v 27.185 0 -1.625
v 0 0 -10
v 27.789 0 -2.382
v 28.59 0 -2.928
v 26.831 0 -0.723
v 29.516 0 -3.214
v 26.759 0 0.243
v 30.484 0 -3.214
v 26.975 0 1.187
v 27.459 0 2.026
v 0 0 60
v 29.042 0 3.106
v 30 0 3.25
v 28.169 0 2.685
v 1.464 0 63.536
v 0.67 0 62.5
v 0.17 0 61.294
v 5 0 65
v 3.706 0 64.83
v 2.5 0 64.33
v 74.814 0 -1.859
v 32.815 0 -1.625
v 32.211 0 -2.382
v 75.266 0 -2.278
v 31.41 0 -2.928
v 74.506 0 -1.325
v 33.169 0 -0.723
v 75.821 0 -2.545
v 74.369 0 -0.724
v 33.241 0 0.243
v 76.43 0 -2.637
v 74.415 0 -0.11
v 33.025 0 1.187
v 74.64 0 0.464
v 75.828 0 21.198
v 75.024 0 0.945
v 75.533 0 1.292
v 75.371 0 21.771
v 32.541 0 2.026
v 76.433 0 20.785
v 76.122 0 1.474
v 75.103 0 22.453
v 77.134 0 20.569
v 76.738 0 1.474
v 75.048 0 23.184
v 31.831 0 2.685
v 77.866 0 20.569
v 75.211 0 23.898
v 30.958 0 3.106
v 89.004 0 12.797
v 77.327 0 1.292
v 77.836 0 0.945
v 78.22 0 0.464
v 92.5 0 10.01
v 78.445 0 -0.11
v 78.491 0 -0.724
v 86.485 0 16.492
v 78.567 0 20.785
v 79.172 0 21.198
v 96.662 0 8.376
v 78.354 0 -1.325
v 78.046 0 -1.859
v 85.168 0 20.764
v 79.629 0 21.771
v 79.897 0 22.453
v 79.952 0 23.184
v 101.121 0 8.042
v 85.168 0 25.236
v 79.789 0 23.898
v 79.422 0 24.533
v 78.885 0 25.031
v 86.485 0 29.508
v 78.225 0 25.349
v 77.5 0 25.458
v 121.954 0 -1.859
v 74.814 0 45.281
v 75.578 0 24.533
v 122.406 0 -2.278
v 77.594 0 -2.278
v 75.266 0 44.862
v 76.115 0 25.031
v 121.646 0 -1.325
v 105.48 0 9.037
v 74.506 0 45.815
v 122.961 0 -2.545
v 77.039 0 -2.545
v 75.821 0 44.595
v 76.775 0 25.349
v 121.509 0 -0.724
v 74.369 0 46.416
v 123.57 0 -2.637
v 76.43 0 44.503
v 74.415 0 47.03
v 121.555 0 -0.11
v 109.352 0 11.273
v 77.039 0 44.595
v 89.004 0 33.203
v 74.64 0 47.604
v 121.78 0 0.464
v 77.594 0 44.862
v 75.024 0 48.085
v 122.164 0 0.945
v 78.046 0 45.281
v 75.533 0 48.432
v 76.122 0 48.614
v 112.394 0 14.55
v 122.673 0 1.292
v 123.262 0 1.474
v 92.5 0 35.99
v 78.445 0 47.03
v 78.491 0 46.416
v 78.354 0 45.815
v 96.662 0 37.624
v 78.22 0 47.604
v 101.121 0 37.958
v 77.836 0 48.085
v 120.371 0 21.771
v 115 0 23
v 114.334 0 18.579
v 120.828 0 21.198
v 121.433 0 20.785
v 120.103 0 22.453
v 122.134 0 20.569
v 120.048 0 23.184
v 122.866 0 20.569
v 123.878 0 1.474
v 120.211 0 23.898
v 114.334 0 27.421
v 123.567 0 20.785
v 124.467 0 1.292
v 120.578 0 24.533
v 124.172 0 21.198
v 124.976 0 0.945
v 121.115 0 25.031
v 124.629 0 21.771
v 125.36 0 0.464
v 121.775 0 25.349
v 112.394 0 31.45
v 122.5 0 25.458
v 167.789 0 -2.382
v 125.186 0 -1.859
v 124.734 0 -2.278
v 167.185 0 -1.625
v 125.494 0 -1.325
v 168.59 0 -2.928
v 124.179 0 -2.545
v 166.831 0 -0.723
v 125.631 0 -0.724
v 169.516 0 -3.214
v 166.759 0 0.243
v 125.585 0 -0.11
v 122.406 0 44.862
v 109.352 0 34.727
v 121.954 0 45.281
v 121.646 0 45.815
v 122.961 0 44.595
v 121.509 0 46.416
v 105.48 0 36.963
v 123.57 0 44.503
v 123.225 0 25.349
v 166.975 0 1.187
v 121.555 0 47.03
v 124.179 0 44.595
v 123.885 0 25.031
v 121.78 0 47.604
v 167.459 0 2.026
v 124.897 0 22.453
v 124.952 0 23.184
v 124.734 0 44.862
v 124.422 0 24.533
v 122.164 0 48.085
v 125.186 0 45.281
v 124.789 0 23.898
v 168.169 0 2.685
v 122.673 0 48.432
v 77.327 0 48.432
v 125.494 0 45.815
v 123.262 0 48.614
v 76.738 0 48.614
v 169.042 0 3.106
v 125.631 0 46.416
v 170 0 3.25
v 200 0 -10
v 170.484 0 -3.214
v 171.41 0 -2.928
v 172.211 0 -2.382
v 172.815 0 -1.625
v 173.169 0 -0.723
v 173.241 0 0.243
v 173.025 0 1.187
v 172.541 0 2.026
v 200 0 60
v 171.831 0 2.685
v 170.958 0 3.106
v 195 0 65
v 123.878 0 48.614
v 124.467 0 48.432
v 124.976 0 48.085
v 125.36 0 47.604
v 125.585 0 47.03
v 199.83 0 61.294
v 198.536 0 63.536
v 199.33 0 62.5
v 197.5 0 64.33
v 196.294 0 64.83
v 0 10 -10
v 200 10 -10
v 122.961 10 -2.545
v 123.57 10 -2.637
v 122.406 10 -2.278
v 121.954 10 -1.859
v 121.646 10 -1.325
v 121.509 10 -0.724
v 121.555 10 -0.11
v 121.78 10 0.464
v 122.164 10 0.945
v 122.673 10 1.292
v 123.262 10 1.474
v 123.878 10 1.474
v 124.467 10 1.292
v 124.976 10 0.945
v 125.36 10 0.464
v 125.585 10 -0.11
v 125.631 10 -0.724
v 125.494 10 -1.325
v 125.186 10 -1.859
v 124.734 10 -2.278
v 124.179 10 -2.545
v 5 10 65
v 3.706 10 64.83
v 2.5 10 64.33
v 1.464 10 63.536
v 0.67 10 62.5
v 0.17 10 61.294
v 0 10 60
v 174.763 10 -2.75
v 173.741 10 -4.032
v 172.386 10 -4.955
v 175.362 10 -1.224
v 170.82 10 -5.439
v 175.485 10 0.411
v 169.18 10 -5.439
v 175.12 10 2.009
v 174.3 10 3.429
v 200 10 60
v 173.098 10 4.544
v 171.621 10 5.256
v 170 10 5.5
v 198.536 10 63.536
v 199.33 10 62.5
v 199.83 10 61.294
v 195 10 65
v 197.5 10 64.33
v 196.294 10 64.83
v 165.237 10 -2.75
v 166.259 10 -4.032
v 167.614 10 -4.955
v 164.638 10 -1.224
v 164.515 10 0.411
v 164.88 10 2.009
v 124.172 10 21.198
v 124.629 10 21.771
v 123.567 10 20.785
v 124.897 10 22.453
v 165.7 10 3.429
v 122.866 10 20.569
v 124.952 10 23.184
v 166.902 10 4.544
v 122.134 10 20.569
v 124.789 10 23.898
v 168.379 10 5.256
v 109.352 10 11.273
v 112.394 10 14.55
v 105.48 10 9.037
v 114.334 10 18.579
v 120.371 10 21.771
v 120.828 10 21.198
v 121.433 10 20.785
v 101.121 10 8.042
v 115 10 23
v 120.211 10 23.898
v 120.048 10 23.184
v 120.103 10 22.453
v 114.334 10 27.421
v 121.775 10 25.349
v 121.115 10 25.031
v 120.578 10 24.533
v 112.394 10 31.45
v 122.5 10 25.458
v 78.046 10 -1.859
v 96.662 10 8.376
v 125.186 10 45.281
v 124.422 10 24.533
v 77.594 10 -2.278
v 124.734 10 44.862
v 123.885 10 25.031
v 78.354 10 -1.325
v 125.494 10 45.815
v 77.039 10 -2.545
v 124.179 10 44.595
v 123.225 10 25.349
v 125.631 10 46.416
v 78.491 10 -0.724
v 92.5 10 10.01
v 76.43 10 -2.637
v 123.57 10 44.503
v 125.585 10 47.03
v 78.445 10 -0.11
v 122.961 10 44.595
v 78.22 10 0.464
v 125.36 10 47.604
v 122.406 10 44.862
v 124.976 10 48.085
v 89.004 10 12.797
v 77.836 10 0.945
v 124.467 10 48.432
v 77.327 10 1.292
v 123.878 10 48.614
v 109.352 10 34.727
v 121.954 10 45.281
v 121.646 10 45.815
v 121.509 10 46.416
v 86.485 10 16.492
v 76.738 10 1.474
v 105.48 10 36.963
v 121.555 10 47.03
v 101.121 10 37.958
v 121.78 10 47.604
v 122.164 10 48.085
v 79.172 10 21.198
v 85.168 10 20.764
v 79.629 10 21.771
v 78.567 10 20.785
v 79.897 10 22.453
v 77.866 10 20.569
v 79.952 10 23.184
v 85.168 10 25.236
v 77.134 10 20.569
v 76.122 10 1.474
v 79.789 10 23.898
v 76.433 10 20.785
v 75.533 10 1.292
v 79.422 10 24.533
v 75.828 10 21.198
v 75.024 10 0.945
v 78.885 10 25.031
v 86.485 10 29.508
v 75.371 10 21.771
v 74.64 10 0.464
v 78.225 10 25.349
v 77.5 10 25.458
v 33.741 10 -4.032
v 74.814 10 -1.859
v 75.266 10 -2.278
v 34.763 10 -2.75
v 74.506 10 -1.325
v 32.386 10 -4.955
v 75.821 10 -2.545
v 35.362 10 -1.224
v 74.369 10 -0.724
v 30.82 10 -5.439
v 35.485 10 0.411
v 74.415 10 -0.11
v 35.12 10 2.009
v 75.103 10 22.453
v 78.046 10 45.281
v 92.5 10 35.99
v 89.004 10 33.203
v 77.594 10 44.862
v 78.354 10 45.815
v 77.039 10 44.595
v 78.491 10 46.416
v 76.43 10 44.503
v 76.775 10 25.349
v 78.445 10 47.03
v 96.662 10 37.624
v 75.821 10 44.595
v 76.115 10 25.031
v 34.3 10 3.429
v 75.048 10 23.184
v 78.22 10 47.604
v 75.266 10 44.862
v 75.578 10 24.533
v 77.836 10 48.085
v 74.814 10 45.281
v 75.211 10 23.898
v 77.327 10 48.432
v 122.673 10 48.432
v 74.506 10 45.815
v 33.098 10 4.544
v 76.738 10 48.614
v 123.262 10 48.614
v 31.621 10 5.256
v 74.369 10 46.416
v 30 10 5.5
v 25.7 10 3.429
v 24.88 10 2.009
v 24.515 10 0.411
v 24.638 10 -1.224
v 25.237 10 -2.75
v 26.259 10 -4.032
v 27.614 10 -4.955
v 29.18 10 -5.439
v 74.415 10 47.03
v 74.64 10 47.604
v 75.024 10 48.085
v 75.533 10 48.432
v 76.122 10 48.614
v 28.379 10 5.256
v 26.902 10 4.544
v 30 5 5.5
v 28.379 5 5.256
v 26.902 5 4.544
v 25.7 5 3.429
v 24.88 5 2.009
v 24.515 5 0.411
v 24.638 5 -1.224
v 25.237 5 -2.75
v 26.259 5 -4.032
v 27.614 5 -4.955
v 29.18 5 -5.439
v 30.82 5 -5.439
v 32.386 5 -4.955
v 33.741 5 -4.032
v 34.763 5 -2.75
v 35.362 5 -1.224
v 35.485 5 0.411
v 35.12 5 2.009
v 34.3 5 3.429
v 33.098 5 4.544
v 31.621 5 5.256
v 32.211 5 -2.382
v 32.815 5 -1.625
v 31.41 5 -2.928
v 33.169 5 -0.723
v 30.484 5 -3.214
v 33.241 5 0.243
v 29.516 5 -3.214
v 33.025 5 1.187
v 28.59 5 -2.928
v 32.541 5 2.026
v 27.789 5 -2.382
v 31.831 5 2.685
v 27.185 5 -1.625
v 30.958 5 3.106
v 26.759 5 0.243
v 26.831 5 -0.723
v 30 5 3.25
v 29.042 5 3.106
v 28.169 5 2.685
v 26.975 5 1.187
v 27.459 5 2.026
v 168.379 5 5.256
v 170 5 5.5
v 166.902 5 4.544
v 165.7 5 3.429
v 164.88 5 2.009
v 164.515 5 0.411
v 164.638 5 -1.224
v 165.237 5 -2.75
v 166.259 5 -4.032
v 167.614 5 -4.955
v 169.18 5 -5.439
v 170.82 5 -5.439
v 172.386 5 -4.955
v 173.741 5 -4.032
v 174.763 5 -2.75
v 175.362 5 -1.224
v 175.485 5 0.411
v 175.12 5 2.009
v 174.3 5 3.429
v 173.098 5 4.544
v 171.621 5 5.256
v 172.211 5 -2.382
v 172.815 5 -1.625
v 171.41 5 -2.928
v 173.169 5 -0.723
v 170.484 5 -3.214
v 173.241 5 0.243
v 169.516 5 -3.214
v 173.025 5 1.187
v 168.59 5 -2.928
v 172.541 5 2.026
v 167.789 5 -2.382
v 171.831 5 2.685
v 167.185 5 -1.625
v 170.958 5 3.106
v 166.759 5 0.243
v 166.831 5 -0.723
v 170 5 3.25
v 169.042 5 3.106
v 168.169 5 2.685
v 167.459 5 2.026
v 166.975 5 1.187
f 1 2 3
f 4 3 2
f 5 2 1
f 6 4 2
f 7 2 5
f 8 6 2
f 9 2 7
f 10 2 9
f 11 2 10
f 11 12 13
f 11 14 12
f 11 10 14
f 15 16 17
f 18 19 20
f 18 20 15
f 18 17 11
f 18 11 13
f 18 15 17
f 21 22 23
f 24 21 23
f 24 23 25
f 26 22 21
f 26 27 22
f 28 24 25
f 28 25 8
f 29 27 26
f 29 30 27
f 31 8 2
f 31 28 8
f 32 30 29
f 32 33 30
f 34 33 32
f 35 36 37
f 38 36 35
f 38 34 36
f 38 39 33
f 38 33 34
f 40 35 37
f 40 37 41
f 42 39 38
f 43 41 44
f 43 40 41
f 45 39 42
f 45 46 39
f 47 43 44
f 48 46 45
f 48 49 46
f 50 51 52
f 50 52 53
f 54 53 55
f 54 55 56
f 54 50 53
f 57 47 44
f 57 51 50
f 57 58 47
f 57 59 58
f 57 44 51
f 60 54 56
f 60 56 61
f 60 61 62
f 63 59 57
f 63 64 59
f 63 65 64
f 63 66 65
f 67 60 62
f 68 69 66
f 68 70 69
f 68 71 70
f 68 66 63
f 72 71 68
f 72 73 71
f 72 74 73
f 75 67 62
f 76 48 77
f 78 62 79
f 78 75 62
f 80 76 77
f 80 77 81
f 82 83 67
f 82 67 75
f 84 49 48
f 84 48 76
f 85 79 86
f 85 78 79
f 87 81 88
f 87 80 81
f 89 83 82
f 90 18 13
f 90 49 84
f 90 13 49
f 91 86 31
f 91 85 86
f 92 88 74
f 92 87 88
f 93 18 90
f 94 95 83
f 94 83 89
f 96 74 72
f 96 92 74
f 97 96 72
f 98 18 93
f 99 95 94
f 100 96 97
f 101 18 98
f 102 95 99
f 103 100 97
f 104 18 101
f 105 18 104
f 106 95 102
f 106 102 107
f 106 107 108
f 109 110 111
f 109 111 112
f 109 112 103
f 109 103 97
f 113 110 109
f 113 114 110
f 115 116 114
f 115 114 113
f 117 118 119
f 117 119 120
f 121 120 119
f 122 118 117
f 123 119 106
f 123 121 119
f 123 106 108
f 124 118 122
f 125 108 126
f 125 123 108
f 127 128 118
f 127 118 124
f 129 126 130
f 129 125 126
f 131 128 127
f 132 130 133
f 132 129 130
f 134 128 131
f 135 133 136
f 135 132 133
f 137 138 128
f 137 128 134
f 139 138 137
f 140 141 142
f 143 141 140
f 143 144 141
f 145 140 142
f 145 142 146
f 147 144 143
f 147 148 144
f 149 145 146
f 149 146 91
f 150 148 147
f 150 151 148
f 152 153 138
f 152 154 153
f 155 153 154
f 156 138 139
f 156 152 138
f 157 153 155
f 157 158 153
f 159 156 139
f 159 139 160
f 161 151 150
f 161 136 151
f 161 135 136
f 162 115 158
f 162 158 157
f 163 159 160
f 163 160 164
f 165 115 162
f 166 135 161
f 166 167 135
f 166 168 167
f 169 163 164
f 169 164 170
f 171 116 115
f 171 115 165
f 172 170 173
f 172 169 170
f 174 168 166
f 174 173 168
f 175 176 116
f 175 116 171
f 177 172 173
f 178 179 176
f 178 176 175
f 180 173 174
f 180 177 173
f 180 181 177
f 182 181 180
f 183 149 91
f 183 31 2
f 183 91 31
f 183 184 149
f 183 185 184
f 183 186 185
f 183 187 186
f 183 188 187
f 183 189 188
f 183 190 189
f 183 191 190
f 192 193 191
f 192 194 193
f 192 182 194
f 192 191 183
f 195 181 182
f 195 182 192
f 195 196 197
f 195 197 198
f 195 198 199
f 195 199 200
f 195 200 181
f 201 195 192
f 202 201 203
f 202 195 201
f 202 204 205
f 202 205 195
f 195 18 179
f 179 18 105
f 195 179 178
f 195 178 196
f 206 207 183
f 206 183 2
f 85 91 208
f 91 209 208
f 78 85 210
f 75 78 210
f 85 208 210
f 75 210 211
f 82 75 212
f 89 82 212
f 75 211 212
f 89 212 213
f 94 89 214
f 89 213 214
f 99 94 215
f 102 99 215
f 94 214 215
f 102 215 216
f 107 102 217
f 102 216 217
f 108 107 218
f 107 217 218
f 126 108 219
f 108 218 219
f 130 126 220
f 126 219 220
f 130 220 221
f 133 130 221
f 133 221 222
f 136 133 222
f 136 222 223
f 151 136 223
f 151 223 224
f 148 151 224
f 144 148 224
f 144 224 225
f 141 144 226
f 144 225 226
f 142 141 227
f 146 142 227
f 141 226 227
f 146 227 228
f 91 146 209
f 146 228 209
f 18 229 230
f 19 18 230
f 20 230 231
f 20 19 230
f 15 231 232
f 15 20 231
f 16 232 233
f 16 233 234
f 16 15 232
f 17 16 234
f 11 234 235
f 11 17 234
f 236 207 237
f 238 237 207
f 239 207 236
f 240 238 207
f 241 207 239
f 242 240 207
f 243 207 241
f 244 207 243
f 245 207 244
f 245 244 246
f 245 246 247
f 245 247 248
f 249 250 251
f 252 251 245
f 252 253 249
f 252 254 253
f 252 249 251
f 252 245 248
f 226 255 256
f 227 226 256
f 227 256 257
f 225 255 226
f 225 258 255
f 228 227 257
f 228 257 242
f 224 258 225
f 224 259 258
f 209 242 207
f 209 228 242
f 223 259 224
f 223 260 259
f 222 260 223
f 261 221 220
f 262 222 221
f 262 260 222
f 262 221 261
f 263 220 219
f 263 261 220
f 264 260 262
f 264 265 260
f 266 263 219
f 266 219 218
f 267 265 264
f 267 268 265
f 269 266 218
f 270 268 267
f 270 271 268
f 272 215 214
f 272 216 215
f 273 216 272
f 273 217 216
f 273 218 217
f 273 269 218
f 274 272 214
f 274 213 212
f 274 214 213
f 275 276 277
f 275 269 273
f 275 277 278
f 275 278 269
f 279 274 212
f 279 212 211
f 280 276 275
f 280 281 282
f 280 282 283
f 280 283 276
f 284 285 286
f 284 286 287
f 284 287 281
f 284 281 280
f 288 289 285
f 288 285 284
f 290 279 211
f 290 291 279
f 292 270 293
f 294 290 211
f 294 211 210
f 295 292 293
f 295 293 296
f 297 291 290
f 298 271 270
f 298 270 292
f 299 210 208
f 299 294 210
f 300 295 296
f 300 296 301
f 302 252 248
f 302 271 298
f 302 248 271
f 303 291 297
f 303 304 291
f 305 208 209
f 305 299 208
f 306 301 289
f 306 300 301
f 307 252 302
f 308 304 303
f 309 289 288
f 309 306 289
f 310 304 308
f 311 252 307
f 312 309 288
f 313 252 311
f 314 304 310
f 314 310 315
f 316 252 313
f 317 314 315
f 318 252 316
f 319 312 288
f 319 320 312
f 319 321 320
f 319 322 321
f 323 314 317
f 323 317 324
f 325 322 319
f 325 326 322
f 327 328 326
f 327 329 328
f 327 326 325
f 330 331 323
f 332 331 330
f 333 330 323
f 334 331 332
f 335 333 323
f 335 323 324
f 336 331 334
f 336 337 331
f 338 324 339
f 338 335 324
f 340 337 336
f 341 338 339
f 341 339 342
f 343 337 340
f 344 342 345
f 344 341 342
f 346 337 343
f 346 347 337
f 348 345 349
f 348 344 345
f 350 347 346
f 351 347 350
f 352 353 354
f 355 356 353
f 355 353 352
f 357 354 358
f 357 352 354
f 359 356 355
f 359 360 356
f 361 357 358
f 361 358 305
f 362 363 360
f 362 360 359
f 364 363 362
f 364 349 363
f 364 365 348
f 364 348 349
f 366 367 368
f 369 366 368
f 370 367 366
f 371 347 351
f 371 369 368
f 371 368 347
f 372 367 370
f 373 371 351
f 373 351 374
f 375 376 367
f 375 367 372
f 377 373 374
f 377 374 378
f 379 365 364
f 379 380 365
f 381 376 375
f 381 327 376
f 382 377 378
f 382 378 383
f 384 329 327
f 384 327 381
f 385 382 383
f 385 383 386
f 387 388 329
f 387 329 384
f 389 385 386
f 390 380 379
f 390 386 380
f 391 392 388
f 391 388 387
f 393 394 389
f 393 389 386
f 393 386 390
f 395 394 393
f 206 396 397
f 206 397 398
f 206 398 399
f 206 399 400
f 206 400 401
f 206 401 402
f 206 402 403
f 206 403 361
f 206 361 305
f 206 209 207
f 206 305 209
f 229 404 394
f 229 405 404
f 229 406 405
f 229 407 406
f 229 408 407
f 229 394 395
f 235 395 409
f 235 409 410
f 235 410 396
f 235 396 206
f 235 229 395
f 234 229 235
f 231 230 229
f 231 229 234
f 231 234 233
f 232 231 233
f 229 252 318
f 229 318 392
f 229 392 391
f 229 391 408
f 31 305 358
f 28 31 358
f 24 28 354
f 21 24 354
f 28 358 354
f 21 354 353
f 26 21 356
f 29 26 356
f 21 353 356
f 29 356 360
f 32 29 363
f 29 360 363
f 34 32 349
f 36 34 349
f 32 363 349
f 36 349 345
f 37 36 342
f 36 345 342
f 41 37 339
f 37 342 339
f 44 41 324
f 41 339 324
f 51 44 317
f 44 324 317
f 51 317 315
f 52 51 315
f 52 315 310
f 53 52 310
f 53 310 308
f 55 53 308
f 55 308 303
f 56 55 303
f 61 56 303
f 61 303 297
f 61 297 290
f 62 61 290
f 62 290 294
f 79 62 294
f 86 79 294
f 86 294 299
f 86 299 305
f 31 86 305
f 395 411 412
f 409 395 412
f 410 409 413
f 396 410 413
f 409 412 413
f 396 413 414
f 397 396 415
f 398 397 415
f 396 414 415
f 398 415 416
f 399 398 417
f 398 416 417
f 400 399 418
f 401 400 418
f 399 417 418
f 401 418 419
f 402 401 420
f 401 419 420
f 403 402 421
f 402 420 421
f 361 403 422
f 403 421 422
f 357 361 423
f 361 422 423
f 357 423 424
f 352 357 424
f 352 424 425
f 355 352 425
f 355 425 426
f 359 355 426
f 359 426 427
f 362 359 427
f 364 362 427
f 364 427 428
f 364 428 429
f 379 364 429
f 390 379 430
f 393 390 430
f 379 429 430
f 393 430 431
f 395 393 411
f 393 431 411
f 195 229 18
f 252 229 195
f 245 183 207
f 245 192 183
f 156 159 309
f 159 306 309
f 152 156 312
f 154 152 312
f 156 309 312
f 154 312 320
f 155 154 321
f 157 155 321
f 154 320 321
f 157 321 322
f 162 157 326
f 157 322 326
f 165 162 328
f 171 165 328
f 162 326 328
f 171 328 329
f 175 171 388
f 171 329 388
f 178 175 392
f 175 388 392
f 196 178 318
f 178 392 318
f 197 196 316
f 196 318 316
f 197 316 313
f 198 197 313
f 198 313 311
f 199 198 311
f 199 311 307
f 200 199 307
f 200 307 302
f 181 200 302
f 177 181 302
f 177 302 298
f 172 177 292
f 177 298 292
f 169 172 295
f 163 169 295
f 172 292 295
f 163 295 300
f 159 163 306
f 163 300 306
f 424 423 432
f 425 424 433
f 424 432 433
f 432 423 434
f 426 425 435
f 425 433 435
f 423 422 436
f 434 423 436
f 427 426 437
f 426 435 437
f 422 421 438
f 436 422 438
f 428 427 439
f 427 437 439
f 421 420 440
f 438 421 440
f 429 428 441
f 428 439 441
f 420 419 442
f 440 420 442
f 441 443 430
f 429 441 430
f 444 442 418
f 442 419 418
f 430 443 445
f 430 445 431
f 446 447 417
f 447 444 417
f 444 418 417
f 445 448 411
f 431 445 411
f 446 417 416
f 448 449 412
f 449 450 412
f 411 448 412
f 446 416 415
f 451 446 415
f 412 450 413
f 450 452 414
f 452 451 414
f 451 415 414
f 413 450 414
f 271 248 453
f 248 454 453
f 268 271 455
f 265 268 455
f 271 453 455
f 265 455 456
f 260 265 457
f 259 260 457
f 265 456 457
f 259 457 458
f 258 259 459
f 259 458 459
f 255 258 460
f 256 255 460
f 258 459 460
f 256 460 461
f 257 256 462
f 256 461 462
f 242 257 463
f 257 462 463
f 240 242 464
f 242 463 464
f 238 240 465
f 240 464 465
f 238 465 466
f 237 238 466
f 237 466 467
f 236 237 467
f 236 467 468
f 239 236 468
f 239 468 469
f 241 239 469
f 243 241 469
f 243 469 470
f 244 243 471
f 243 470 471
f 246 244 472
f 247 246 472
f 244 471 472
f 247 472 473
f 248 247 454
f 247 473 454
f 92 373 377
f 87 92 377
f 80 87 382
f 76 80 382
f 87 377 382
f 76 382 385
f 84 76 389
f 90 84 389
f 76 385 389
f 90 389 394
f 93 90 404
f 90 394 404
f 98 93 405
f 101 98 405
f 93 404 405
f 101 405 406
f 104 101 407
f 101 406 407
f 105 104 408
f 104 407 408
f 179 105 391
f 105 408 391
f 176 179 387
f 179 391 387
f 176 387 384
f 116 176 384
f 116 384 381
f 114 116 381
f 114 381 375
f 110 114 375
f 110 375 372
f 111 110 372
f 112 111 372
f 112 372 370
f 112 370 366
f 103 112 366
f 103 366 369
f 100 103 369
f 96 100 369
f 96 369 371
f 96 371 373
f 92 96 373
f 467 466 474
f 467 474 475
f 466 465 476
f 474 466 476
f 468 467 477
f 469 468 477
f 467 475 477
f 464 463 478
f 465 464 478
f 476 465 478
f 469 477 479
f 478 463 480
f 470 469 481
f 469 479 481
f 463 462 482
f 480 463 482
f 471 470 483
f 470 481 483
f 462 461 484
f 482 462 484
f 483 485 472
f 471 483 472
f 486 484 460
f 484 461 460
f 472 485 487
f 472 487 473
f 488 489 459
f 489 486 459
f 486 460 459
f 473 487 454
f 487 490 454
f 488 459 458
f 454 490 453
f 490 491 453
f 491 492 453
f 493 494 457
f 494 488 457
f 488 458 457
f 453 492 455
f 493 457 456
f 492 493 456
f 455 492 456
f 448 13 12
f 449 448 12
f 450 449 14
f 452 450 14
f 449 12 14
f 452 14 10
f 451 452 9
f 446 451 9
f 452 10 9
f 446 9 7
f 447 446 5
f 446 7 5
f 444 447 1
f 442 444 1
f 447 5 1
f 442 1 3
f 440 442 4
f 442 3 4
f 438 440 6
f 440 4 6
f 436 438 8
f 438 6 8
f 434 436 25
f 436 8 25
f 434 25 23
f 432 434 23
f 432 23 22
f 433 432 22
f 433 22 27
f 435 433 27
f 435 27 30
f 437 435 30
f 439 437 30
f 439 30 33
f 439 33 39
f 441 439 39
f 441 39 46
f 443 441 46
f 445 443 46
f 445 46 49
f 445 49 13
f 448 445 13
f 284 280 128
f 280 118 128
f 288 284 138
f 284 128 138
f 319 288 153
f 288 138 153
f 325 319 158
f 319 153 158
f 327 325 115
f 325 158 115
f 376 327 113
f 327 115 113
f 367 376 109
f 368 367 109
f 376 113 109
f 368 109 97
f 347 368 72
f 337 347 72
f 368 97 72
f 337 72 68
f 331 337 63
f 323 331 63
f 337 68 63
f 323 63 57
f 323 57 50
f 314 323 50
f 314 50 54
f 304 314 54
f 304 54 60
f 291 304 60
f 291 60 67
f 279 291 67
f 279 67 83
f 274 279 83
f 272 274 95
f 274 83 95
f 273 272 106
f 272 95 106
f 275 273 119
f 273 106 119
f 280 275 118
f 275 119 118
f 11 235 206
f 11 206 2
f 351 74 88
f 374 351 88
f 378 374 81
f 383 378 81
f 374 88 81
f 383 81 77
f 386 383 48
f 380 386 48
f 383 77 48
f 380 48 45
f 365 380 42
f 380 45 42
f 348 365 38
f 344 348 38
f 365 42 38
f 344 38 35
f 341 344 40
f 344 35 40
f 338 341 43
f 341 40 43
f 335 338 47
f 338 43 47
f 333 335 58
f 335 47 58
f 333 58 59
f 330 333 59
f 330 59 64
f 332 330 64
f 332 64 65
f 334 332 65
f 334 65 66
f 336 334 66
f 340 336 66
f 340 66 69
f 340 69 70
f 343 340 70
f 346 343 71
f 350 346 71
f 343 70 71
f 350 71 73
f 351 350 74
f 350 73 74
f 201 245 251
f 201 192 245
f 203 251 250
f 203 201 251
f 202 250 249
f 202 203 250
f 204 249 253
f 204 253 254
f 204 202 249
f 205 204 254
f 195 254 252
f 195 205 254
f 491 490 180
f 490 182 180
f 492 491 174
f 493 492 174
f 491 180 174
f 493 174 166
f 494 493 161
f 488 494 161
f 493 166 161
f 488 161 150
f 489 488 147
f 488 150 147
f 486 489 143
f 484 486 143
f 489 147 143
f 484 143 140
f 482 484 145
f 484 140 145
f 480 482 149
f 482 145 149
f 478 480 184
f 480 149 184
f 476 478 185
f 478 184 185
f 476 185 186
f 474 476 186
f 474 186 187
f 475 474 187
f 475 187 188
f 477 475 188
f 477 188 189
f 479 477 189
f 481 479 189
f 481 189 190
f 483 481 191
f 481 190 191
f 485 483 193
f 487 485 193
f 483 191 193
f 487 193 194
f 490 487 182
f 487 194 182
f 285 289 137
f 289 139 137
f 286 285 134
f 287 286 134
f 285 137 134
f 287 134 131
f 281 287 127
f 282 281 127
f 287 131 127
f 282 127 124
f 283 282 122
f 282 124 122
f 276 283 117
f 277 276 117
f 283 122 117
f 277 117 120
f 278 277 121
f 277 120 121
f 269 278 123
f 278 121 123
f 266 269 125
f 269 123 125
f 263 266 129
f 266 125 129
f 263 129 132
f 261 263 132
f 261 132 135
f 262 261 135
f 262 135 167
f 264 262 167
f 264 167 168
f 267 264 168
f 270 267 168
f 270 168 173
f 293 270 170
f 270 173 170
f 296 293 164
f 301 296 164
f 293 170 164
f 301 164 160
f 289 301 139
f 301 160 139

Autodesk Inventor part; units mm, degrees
ref_plane "YZ Plane" through (0, 0, 0) normal (1, 0, 0) x (0, 1, 0)
ref_plane "XZ Plane" through (0, 0, 0) normal (0, 1, 0) x (-1, 0, 0)
ref_plane "XY Plane" through (0, 0, 0) normal (0, 0, 1) x (1, 0, 0)
sketch "Sketch1" plane through (0, 0, 0) normal (0, 0, 1) x (1, 0, 0)
  line L0 (0, 0) -> (200, 0)
  line L1 (200, 0) -> (200, 10)
  line L2 (200, 10) -> (0, 10)
  line L3 (0, 10) -> (0, 0)
  dimension "d0" = 200
  dimension "d1" = 10
extrude "Extrusion1" add sketch "Sketch1" along normal blind 70
sketch "Sketch3" plane through (0, 0, 0) normal (0, -1, 0) x (1, 0, 0)
  line L0 (200, 0) -> (200, 70) projected
  line L1 (200, 38) -> (0, 38)
  line L2 (0, 0) -> (0, 70) projected
  line L3 (0, 0) -> (200, 0) projected
  line L4 (200, 20) -> (0, 20)
  line L5 (100, 38) -> (100, 23)
  circle A0 centre (100, 23) radius 15
  circle A1 centre (76.43, -0.57) radius 2.5
  circle A2 centre (76.43, 46.57) radius 2.5
  circle A3 centre (123.57, 46.57) radius 2.5
  circle A4 centre (123.57, -0.57) radius 2.5
  dimension "d11" = 38
  dimension "d12" = 20
  dimension "d13" = 15
  dimension "d14" = 30
  dimension "d15" = 5
  dimension "d16" = 23.57
  dimension "d17" = 23.57
  dimension "d18" = 47.14
  dimension "d19" = 47.14
  dimension "d20" = 5
  dimension "d21" = 5
  dimension "d22" = 5
  dimension "d23" = 47.14
extrude "Extrusion2" cut sketch "Sketch3" against normal blind 10 contours A0 L4 | L4 A0
sketch "Sketch4" plane through (0, 10, 0) normal (0, 1, 0) x (1, 0, 0)
  line L0 (200, 0) -> (200, -70) projected
  line L1 (200, -23) -> (0, -23)
  line L2 (200, 0) -> (0, 0) projected
  circle A0 centre (122.5, -23) radius 3
  circle A1 centre (77.5, -23) radius 3
  point P0 (100, -23)
  dimension "d26" = 23
  dimension "d27" = 6
  dimension "d28" = 6
  dimension "d29" = 22.5
  dimension "d30" = 45
sketch "Sketch5" plane through (0, 0, 0) normal (0, 0, -1) x (-1, 0, 0)
  line L0 (-200, 0) -> (-200, 10) projected
  line L1 (0, 0) -> (-200, 0)
  line L2 (-200, 0) -> (-200, 10)
  line L3 (-200, 10) -> (0, 10)
  line L4 (0, 10) -> (0, 0)
extrude "Extrusion4" add sketch "Sketch5" along normal blind 10
sketch "Sketch6" plane through (0, 10, 70) normal (0, 1, 0) x (1, 0, 0)
  point P0 (0, 70)
sketch "Sketch7" plane through (0, 10, 70) normal (0, 1, 0) x (1, 0, 0)
  line L0 (200, 0) -> (0, 0) projected
  line L1 (0, 80) -> (0, 0) projected
  line L2 (200, 0) -> (0, 0)
  line L3 (0, 0) -> (0, 5)
  line L4 (0, 5) -> (200, 5)
  line L5 (200, 5) -> (200, 0)
  point P0 (0, 70)
  dimension "d47" = 5
extrude "Extrusion5" cut sketch "Sketch7" against normal blind 10
sketch "Sketch8" plane through (0, 10, -10) normal (0, 1, 0) x (1, 0, 0)
  line L0 (200, -20) -> (140, -20) projected
  line L1 (60, -10) -> (140, -10) projected
  line L2 (60, -20) -> (0, -20) projected
  point P0 (0, -10)
  point P1 (170, -10)
  point P2 (30, -10)
  point P3 (170, -20)
  point P4 (30, -20)
hole "Hole1" at (30, 10, 0) at (170, 10, 0) direction (0, -1, 0) diameter 6.5 end through all counterbore diameter 11 counterbore depth 5
hole "Hole2" at (77.5, 10, 23) at (122.5, 10, 23) direction (0, -1, 0) diameter 4.917 end through all thread size "M6x1" class "6H" standard "ISO Metric profile"
sketch "Sketch9" plane through (0, 10, -10) normal (0, 1, 0) x (1, 0, 0)
  point P0 (0, -10)
hole "Hole3" at (123.57, 0, 46.57) at (76.43, 0, 46.57) at (123.57, 0, -0.57) at (76.43, 0, -0.57) direction (0, 1, 0) diameter 4.134 end through all thread size "M5x0.8" class "6H" standard "ISO Metric profile"
fillet "Fillet1" radius 5 2 edges at (200, 5, 65) (0, 5, 65)
properties part number "Nap_tren"
